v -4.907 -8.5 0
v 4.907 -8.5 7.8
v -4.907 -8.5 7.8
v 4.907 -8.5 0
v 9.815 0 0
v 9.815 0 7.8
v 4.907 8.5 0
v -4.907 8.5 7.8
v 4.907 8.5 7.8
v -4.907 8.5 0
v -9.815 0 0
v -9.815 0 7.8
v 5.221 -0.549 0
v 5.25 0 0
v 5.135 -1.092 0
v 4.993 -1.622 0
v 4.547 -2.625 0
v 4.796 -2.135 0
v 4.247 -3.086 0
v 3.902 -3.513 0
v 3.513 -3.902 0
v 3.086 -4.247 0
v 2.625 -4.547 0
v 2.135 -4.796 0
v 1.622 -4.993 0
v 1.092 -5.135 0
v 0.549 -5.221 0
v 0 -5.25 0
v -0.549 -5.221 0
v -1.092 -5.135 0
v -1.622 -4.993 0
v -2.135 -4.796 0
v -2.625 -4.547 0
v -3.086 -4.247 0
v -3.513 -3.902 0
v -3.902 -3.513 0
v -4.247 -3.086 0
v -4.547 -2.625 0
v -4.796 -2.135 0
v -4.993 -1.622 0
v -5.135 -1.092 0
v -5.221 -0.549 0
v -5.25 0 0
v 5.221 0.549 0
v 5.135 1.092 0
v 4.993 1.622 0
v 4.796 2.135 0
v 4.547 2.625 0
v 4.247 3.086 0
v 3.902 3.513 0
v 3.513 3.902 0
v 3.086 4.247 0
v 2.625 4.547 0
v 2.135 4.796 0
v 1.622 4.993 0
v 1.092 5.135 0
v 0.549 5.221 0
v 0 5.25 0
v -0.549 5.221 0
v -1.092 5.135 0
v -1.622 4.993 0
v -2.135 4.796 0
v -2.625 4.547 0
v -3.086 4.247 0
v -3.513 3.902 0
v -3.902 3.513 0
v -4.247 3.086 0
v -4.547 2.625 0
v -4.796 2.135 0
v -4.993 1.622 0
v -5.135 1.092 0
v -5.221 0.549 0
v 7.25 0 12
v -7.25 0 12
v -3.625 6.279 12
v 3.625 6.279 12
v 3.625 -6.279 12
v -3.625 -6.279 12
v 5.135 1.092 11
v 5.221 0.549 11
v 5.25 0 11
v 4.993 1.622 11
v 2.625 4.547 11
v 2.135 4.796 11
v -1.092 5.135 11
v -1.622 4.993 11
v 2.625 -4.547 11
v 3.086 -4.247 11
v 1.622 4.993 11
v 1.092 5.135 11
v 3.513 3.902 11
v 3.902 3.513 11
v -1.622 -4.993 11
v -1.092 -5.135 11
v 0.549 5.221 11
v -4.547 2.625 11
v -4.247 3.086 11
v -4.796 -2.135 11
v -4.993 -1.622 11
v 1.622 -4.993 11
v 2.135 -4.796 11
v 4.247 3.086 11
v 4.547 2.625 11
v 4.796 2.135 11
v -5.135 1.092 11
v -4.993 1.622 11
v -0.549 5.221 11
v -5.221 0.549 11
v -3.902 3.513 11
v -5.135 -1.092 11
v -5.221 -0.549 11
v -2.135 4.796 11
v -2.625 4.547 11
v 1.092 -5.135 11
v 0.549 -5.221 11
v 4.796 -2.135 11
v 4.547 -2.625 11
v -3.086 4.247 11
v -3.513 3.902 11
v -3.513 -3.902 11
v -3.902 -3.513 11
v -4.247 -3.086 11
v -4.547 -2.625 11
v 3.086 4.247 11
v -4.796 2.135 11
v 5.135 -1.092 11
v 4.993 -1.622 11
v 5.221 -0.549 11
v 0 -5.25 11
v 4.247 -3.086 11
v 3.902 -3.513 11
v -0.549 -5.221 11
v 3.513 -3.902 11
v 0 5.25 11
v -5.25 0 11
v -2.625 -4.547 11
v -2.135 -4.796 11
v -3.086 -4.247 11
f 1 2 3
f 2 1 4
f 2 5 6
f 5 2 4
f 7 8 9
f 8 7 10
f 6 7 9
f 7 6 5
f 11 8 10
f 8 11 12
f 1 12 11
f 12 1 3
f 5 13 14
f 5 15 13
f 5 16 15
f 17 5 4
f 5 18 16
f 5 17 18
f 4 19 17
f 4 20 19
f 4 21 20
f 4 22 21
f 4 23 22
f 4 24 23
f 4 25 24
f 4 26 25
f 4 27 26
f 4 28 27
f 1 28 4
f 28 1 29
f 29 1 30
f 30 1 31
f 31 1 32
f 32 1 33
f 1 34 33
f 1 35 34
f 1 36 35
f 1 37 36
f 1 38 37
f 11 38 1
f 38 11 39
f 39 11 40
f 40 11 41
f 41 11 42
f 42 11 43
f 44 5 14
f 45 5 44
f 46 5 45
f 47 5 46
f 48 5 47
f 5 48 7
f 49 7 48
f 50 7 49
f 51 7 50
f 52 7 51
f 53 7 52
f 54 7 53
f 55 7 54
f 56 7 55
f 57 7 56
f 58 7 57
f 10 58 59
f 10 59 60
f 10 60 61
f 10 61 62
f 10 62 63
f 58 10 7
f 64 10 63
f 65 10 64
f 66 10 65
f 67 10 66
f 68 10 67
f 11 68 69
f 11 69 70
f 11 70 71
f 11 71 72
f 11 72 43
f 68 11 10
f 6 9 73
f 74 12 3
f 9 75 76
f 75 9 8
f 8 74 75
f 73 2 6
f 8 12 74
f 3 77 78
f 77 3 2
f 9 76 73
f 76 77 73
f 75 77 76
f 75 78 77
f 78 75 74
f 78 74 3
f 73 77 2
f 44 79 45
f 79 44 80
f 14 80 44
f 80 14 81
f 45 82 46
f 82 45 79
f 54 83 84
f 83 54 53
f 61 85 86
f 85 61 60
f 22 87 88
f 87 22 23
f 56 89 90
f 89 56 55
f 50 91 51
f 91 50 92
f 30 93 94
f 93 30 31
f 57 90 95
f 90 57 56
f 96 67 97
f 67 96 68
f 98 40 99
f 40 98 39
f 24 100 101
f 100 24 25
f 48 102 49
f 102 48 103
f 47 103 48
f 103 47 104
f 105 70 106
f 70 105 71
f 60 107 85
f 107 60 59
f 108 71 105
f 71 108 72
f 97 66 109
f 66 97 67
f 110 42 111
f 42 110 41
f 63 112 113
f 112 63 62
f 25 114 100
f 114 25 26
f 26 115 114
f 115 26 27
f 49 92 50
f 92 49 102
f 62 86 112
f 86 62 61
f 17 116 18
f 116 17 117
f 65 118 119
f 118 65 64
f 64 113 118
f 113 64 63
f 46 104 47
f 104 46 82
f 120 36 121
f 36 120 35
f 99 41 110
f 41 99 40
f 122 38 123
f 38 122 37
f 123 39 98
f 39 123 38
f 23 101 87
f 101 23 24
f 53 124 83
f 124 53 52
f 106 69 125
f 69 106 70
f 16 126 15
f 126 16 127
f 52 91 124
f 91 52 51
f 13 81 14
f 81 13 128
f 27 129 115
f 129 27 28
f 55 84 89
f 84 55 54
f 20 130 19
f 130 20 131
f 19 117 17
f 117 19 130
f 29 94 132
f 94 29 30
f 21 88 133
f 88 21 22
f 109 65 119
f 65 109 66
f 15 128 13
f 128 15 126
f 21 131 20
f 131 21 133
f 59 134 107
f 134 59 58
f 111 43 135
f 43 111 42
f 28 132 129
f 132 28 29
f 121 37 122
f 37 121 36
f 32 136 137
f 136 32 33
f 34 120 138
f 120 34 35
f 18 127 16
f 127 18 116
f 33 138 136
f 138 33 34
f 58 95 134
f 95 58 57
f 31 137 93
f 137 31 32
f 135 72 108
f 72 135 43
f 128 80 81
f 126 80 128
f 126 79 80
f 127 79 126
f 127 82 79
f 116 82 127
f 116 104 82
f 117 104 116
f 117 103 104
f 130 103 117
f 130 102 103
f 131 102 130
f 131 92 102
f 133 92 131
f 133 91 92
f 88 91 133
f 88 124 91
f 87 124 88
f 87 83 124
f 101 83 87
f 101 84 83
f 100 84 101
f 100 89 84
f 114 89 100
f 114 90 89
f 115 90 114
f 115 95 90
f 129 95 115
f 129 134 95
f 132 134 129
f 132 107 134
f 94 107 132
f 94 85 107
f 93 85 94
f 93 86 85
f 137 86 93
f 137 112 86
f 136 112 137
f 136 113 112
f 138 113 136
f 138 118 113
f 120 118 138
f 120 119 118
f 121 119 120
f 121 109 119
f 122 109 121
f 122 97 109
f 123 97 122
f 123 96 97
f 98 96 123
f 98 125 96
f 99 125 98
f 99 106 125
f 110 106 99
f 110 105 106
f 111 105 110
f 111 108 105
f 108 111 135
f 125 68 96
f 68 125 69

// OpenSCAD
// Blind cap nut.
$fn = 60;
eps = 0.02;
thread_d = 10.5;
flat = 17;
height = 12;
body_h = height*0.65;
difference() {
    union() {
        cylinder(d=flat/cos(30),h=body_h,$fn=6);
        translate([0,0,body_h]) cylinder(d1=flat/cos(30),d2=thread_d+4,h=height-body_h,$fn=6);
    }
    translate([0,0,-eps]) cylinder(d=thread_d,h=height-1+eps);
}
